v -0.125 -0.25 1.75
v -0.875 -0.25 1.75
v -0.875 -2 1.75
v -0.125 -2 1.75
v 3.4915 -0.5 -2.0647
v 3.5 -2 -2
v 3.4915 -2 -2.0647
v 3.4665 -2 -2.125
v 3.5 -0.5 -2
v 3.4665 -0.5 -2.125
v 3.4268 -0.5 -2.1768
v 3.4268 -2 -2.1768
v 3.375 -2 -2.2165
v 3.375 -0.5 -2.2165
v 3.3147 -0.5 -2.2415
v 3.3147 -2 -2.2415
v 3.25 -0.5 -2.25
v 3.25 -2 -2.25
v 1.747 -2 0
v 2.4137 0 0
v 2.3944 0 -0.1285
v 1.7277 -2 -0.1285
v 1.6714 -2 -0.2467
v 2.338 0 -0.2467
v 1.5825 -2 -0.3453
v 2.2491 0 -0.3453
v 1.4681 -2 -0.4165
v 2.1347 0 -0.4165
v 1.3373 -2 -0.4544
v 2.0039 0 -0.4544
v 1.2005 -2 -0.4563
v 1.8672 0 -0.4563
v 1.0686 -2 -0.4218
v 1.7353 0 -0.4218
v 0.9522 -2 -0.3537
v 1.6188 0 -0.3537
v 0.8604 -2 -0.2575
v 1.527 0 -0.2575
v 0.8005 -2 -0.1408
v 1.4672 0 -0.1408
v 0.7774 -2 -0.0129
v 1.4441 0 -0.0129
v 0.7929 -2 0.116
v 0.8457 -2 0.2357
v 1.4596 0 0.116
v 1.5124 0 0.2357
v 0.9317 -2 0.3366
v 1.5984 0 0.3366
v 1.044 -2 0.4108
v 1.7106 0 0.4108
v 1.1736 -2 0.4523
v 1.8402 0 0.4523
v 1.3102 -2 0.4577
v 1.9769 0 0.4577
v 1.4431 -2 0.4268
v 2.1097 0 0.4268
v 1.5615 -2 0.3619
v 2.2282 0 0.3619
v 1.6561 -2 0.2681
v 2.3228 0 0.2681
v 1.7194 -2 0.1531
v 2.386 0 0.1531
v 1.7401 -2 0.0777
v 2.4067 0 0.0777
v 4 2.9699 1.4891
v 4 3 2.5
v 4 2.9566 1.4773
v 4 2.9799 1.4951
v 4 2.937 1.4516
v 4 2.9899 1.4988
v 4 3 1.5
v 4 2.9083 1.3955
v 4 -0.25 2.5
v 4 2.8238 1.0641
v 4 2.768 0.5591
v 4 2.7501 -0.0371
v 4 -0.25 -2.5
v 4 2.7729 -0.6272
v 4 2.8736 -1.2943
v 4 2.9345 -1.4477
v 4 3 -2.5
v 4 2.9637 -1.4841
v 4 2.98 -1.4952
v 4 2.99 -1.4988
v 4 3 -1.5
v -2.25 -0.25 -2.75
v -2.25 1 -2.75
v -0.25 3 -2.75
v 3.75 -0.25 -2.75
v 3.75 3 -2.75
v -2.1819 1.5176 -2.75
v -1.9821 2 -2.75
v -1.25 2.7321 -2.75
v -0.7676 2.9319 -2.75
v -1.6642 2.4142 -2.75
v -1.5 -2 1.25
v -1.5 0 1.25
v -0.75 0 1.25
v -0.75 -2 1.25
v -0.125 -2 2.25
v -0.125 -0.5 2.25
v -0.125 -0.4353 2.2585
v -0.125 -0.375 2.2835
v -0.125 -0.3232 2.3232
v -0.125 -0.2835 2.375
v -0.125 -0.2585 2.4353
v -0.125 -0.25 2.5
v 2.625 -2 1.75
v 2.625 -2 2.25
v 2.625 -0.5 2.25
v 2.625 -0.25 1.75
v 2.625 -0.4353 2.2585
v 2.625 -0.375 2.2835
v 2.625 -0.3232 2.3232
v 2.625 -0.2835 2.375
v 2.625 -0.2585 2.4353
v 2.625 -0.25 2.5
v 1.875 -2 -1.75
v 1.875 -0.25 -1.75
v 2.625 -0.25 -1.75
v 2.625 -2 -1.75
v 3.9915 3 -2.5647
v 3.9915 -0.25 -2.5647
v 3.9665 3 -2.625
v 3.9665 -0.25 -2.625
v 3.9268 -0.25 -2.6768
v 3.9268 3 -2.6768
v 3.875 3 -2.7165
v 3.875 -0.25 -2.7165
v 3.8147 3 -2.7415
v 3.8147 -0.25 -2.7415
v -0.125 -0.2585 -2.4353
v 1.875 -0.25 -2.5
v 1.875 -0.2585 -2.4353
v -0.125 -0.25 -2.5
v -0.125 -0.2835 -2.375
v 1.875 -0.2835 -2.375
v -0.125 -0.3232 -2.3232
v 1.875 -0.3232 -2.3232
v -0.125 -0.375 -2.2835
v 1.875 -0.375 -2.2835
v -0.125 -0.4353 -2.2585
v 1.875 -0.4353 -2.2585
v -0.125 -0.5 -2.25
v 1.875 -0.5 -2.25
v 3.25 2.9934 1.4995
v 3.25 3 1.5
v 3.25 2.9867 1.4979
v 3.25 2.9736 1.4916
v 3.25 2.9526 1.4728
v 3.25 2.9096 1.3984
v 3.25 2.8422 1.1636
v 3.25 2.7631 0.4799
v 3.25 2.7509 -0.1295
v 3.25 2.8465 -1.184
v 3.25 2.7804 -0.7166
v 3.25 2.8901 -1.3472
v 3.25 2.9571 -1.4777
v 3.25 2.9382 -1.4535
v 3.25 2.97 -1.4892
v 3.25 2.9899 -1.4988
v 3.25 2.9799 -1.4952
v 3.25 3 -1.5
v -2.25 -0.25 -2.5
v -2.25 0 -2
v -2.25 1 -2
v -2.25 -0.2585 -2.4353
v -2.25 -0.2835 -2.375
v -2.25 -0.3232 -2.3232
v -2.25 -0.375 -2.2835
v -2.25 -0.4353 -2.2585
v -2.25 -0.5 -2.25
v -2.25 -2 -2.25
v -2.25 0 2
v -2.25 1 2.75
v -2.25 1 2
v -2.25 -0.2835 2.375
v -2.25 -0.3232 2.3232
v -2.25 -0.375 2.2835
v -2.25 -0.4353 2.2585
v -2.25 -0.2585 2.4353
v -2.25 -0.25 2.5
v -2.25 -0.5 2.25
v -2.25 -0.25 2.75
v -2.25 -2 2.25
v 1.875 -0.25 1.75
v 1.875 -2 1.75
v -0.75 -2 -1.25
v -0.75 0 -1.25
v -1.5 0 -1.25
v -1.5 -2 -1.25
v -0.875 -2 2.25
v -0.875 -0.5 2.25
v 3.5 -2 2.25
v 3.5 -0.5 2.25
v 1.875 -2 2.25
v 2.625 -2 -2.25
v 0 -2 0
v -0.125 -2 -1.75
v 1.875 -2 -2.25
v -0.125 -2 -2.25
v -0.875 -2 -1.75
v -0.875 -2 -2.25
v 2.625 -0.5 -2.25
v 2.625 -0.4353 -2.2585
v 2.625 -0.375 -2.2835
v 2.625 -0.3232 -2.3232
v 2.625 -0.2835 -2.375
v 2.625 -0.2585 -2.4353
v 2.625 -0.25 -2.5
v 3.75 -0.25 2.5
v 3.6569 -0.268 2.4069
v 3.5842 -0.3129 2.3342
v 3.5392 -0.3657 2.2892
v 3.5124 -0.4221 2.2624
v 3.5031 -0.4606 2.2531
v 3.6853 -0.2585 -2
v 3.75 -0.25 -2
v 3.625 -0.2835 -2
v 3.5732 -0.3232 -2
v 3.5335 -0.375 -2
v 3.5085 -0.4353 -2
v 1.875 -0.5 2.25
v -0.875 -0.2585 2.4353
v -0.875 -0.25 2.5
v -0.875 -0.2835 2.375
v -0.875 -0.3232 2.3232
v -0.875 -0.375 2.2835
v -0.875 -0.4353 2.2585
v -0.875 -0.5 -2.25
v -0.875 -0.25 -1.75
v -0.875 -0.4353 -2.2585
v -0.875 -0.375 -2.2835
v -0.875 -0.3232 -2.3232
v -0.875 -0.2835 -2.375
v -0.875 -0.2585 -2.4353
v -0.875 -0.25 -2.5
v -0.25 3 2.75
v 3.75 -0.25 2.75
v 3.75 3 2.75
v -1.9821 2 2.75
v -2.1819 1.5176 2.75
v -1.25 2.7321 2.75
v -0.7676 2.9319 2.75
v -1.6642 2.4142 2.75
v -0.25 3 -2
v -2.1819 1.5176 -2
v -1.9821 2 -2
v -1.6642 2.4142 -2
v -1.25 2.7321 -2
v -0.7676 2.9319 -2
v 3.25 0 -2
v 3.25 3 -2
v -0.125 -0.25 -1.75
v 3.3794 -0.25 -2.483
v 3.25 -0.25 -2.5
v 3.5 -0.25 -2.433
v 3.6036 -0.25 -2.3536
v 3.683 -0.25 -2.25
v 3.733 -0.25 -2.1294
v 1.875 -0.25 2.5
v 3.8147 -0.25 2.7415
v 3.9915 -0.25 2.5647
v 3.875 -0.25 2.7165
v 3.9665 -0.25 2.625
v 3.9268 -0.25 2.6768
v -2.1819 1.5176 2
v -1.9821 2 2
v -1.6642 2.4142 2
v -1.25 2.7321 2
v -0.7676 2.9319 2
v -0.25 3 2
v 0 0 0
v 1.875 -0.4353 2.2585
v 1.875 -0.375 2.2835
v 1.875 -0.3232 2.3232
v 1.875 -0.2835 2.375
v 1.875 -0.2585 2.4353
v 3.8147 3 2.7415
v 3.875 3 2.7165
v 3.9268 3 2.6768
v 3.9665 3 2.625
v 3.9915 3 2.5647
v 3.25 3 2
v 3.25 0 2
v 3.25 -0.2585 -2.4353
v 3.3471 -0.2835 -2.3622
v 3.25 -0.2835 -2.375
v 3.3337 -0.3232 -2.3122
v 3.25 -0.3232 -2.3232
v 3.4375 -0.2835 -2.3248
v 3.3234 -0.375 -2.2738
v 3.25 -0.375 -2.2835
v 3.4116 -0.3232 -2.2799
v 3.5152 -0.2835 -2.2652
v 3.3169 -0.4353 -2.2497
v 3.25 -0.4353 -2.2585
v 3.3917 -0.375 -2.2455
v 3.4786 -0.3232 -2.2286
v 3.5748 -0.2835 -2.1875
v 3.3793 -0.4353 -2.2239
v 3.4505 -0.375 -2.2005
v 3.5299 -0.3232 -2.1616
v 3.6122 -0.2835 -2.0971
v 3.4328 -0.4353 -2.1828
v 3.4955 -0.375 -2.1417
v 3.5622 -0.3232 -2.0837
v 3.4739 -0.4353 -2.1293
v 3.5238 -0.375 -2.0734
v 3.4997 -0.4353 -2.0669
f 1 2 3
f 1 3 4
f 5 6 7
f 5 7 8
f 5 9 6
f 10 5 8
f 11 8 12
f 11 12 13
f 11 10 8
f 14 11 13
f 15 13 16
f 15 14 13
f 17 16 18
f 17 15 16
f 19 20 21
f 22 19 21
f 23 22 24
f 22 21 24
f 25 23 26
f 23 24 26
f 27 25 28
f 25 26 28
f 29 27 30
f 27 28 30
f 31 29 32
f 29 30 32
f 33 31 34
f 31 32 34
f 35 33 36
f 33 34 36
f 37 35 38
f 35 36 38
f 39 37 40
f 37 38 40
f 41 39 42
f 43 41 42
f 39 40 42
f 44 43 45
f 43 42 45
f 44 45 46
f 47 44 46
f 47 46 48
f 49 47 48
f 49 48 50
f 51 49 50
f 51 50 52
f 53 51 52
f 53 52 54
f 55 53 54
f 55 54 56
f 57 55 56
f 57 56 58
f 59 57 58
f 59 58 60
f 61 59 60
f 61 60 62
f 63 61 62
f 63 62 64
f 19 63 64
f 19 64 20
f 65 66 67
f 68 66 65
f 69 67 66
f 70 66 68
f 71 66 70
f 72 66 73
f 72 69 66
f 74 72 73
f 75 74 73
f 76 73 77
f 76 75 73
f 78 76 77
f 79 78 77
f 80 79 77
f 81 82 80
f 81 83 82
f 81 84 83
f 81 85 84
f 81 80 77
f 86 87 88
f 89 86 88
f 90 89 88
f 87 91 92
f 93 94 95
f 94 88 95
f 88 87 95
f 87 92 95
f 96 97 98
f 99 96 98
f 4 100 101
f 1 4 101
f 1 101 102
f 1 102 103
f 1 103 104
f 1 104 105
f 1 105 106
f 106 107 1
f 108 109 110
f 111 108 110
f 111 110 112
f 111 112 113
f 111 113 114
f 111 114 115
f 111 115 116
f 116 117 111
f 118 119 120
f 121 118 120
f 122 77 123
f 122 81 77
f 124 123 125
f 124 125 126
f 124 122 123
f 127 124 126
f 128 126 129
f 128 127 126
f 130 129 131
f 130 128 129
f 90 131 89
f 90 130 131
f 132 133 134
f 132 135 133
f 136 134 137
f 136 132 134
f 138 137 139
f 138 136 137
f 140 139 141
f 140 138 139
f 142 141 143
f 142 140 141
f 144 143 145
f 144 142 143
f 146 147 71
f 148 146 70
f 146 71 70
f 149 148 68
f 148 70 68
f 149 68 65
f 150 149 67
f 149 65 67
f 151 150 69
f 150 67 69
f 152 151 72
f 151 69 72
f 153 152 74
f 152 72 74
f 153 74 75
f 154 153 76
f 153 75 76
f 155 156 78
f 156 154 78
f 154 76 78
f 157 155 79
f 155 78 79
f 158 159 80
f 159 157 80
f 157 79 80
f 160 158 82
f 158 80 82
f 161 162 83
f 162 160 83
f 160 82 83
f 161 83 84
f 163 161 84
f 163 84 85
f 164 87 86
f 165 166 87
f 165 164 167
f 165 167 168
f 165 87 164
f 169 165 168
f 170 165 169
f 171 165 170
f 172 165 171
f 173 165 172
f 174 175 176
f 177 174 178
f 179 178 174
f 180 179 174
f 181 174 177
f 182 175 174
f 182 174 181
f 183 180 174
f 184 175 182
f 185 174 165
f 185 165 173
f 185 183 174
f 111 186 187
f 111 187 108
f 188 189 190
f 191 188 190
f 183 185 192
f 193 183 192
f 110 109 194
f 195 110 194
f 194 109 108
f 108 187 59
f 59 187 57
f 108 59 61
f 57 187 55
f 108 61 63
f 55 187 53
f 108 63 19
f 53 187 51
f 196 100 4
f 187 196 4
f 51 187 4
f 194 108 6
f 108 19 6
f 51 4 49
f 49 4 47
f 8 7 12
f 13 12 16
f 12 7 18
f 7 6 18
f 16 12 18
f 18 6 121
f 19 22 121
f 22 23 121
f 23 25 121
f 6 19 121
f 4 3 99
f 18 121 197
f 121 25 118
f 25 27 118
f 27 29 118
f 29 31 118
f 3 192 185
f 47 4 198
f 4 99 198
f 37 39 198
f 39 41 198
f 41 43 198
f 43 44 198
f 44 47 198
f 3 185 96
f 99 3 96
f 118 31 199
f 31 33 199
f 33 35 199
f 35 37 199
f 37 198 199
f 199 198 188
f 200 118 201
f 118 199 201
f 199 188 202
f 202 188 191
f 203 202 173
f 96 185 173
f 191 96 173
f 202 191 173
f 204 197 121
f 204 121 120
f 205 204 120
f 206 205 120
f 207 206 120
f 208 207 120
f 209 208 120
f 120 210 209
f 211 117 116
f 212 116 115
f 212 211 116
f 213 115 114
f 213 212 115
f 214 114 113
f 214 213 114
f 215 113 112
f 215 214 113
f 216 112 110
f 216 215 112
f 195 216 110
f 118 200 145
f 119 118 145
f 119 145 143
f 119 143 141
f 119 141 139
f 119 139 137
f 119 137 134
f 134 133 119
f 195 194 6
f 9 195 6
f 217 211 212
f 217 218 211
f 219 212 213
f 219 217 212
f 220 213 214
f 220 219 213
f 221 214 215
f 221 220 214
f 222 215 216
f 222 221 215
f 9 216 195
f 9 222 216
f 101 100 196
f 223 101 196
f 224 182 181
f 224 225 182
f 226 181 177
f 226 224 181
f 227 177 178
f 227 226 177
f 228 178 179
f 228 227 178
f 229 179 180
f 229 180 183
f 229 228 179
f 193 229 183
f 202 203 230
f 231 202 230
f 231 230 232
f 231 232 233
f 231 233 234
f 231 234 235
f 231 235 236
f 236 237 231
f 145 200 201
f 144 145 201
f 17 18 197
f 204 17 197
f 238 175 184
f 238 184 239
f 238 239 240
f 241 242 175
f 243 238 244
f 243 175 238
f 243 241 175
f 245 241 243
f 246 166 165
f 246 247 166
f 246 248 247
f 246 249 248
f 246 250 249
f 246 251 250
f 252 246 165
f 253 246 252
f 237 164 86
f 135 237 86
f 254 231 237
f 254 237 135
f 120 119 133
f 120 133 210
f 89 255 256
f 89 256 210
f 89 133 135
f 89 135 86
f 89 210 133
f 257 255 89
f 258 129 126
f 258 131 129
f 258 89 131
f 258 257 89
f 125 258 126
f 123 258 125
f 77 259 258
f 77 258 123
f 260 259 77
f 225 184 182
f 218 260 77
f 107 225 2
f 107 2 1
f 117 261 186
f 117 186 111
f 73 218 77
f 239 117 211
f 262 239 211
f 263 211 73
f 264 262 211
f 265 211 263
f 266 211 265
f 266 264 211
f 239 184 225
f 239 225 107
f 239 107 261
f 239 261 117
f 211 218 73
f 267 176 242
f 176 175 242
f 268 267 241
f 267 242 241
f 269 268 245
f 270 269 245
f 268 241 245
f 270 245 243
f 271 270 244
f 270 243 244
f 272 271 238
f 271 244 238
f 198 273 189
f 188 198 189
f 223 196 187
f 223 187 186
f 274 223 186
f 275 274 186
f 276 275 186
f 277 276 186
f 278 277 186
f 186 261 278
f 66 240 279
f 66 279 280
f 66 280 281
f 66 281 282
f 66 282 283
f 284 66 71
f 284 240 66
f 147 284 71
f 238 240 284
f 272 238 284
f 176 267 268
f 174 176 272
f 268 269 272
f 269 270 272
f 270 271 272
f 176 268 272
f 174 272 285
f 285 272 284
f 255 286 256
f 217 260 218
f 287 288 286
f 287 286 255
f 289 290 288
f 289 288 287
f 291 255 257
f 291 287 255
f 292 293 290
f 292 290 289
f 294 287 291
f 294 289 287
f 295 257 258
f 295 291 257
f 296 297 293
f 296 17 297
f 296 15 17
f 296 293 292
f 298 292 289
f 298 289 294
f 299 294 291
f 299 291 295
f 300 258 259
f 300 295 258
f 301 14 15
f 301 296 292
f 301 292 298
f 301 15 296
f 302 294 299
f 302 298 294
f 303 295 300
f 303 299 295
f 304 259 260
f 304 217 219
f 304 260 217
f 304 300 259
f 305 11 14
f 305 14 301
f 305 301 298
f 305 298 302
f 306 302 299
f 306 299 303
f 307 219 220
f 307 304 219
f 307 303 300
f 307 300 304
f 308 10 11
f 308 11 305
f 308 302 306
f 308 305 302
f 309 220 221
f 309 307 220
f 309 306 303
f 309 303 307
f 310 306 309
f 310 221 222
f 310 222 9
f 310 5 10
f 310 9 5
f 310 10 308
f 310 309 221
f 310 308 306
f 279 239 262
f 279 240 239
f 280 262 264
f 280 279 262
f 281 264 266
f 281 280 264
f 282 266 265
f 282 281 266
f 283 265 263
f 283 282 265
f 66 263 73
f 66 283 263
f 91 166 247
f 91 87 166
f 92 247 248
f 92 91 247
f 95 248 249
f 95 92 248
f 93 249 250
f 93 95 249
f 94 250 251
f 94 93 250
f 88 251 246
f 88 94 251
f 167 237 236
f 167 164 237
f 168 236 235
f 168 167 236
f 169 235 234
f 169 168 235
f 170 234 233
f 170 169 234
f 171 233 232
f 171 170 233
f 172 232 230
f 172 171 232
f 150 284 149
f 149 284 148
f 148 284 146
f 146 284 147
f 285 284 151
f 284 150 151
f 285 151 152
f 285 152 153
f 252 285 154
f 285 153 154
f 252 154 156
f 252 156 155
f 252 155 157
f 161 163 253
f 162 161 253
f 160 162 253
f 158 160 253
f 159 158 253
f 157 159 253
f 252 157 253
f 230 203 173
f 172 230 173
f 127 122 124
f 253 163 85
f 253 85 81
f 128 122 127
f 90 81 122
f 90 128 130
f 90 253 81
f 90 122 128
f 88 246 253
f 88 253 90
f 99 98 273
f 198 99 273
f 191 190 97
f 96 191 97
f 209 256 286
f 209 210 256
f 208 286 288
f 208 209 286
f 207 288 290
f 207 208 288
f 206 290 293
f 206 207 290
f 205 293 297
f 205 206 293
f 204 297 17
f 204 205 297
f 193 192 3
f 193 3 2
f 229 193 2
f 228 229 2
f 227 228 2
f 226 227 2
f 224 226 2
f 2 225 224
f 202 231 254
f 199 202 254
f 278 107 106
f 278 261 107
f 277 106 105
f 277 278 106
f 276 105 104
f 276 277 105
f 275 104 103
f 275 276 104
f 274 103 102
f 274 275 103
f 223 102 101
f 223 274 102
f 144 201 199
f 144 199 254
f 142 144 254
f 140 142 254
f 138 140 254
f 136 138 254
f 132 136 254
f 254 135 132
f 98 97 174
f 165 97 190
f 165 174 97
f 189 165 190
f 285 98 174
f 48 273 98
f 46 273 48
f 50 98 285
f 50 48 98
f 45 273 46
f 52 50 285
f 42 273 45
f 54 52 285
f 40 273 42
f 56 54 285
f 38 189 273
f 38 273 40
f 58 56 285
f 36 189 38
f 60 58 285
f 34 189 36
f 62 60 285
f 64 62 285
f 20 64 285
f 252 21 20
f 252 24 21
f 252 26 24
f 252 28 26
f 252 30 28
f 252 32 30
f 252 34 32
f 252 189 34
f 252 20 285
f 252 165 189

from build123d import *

# Parameters (mm, degrees)
BOSS_EXTRUDE2_DEPTH = 2
SKETCH8_R           = 0.46
CUT_EXTRUDE1_DEPTH  = 6.857687257
CUT_EXTRUDE3_DEPTH  = 5.308421985
BOSS_EXTRUDE3_DEPTH = 0.75
SKETCH11_W          = 5.5
SKETCH11_H          = 5
BOSS_EXTRUDE4_DEPTH = 0.75
FILLET1_R           = 2
CUT_EXTRUDE5_DEPTH  = 1.75
SKETCH13_W          = 0.75
SKETCH13_H          = 1.75
CUT_EXTRUDE4_DEPTH  = 0.5
FILLET2_R           = 0.25
FILLET3_R           = 0.25
SKETCH15_RX         = 1.5
SKETCH15_RY         = 0.25
CUT_EXTRUDE6_DEPTH  = 10


with BuildPart() as part:
    # Sketch5 → Boss-Extrude2 (new body)
    with BuildSketch(Plane(origin=(0, 0, 0), x_dir=(1, 0, 0), z_dir=(0, 1, 0))):
        Polygon((-2.25, -2), (1.75, -2), (3.25, -2), (3.25, 2), (1.75, 2), (-2.25, 2), align=None)
    extrude(amount=-BOSS_EXTRUDE2_DEPTH)

    # Sketch8 → Cut-Extrude1 (cut, through all)
    with BuildSketch(Plane(origin=(0.85, 2.55, 0), x_dir=(0.948683298050514, -0.3162277660168378, 0), z_dir=(0.3162277660168378, 0.948683298050514, 0))):
        with Locations((1.829822128, 0)):
            Circle(SKETCH8_R)
    extrude(amount=-CUT_EXTRUDE1_DEPTH, mode=Mode.SUBTRACT)

    # Sketch12 → Cut-Extrude3 (cut, through all)
    with BuildSketch(Plane(origin=(0, 0, 0), x_dir=(1, 0, 0), z_dir=(0, 1, 0))):
        Polygon((-1.5, 1.25), (-1.5, -1.25), (-0.75, -1.25), (0, 0), (-0.75, 1.25), align=None)
    extrude(amount=-CUT_EXTRUDE3_DEPTH, mode=Mode.SUBTRACT)

    # Sketch10 → Boss-Extrude3 (add)
    with BuildSketch(Plane.XY.offset(2)):
        Polygon((3.25, -2), (3.25, 3), (-2.25, 3), (-2.25, 0), (-2.25, -2), align=None)
    boss_extrude3 = extrude(amount=BOSS_EXTRUDE3_DEPTH)

    # Mirror1: Boss-Extrude3 across plane
    add(boss_extrude3.mirror(Plane.XY))

    # Sketch11 → Boss-Extrude4 (add)
    with BuildSketch(Plane(origin=(3.25, 0, 0), x_dir=(0, 0, -1), z_dir=(1, 0, 0))):
        with Locations((0, 0.5)):
            Rectangle(SKETCH11_W, SKETCH11_H)
    extrude(amount=BOSS_EXTRUDE4_DEPTH)

    # Fillet1
    fillet1_edges = [part.edges().sort_by_distance(p)[0] for p in [
        (-2.25, 3, 2.375),
        (-2.25, 3, -2.375),
    ]]
    fillet(fillet1_edges, radius=FILLET1_R)

    # Sketch14 → Cut-Extrude5 (cut)
    with BuildSketch(Plane.XZ.offset(2)):
        Polygon((-2.25, 2.75), (-2.25, 2.25), (3.5, 2.25), (3.5, -2.25), (-2.25, -2.25), (-2.25, -2.75), (4, -2.75), (4, 2.75), align=None)
    extrude(amount=-CUT_EXTRUDE5_DEPTH, mode=Mode.SUBTRACT)

    # Sketch13 → Cut-Extrude4 (cut)
    with BuildSketch(Plane.XY.offset(2.25)):
        with Locations((-0.5, -1.125)):
            Rectangle(SKETCH13_W, SKETCH13_H)
        with Locations((2.25, -1.125)):
            Rectangle(SKETCH13_W, SKETCH13_H)
    cut_extrude4 = extrude(amount=-CUT_EXTRUDE4_DEPTH, mode=Mode.SUBTRACT)

    # Mirror2: Cut-Extrude4 across plane
    add(cut_extrude4.mirror(Plane.XY), mode=Mode.SUBTRACT)

    # Fillet2
    fillet2_edges = [part.edges().sort_by_distance(p)[0] for p in [
        (3.0625, -0.25, -2.25),
        (3.5, -0.25, 0),
        (3.5, -1.125, -2.25),
        (-1.5625, -0.25, 2.25),
        (0.875, -0.25, 2.25),
        (3.0625, -0.25, 2.25),
        (0.875, -0.25, -2.25),
        (-1.5625, -0.25, -2.25),
    ]]
    fillet(fillet2_edges, radius=FILLET2_R)

    # Fillet3
    fillet3_edges = [part.edges().sort_by_distance(p)[0] for p in [
        (4, 1.375, -2.75),
        (4, 1.375, 2.75),
    ]]
    fillet(fillet3_edges, radius=FILLET3_R)

    # Sketch15 → Cut-Extrude6 (cut)
    with BuildSketch(Plane(origin=(4, 0, 0), x_dir=(0, 0, -1), z_dir=(1, 0, 0))):
        with Locations((0, 3)):
            Ellipse(SKETCH15_RX, SKETCH15_RY)
    extrude(amount=-CUT_EXTRUDE6_DEPTH, mode=Mode.SUBTRACT)


solid = part.part
